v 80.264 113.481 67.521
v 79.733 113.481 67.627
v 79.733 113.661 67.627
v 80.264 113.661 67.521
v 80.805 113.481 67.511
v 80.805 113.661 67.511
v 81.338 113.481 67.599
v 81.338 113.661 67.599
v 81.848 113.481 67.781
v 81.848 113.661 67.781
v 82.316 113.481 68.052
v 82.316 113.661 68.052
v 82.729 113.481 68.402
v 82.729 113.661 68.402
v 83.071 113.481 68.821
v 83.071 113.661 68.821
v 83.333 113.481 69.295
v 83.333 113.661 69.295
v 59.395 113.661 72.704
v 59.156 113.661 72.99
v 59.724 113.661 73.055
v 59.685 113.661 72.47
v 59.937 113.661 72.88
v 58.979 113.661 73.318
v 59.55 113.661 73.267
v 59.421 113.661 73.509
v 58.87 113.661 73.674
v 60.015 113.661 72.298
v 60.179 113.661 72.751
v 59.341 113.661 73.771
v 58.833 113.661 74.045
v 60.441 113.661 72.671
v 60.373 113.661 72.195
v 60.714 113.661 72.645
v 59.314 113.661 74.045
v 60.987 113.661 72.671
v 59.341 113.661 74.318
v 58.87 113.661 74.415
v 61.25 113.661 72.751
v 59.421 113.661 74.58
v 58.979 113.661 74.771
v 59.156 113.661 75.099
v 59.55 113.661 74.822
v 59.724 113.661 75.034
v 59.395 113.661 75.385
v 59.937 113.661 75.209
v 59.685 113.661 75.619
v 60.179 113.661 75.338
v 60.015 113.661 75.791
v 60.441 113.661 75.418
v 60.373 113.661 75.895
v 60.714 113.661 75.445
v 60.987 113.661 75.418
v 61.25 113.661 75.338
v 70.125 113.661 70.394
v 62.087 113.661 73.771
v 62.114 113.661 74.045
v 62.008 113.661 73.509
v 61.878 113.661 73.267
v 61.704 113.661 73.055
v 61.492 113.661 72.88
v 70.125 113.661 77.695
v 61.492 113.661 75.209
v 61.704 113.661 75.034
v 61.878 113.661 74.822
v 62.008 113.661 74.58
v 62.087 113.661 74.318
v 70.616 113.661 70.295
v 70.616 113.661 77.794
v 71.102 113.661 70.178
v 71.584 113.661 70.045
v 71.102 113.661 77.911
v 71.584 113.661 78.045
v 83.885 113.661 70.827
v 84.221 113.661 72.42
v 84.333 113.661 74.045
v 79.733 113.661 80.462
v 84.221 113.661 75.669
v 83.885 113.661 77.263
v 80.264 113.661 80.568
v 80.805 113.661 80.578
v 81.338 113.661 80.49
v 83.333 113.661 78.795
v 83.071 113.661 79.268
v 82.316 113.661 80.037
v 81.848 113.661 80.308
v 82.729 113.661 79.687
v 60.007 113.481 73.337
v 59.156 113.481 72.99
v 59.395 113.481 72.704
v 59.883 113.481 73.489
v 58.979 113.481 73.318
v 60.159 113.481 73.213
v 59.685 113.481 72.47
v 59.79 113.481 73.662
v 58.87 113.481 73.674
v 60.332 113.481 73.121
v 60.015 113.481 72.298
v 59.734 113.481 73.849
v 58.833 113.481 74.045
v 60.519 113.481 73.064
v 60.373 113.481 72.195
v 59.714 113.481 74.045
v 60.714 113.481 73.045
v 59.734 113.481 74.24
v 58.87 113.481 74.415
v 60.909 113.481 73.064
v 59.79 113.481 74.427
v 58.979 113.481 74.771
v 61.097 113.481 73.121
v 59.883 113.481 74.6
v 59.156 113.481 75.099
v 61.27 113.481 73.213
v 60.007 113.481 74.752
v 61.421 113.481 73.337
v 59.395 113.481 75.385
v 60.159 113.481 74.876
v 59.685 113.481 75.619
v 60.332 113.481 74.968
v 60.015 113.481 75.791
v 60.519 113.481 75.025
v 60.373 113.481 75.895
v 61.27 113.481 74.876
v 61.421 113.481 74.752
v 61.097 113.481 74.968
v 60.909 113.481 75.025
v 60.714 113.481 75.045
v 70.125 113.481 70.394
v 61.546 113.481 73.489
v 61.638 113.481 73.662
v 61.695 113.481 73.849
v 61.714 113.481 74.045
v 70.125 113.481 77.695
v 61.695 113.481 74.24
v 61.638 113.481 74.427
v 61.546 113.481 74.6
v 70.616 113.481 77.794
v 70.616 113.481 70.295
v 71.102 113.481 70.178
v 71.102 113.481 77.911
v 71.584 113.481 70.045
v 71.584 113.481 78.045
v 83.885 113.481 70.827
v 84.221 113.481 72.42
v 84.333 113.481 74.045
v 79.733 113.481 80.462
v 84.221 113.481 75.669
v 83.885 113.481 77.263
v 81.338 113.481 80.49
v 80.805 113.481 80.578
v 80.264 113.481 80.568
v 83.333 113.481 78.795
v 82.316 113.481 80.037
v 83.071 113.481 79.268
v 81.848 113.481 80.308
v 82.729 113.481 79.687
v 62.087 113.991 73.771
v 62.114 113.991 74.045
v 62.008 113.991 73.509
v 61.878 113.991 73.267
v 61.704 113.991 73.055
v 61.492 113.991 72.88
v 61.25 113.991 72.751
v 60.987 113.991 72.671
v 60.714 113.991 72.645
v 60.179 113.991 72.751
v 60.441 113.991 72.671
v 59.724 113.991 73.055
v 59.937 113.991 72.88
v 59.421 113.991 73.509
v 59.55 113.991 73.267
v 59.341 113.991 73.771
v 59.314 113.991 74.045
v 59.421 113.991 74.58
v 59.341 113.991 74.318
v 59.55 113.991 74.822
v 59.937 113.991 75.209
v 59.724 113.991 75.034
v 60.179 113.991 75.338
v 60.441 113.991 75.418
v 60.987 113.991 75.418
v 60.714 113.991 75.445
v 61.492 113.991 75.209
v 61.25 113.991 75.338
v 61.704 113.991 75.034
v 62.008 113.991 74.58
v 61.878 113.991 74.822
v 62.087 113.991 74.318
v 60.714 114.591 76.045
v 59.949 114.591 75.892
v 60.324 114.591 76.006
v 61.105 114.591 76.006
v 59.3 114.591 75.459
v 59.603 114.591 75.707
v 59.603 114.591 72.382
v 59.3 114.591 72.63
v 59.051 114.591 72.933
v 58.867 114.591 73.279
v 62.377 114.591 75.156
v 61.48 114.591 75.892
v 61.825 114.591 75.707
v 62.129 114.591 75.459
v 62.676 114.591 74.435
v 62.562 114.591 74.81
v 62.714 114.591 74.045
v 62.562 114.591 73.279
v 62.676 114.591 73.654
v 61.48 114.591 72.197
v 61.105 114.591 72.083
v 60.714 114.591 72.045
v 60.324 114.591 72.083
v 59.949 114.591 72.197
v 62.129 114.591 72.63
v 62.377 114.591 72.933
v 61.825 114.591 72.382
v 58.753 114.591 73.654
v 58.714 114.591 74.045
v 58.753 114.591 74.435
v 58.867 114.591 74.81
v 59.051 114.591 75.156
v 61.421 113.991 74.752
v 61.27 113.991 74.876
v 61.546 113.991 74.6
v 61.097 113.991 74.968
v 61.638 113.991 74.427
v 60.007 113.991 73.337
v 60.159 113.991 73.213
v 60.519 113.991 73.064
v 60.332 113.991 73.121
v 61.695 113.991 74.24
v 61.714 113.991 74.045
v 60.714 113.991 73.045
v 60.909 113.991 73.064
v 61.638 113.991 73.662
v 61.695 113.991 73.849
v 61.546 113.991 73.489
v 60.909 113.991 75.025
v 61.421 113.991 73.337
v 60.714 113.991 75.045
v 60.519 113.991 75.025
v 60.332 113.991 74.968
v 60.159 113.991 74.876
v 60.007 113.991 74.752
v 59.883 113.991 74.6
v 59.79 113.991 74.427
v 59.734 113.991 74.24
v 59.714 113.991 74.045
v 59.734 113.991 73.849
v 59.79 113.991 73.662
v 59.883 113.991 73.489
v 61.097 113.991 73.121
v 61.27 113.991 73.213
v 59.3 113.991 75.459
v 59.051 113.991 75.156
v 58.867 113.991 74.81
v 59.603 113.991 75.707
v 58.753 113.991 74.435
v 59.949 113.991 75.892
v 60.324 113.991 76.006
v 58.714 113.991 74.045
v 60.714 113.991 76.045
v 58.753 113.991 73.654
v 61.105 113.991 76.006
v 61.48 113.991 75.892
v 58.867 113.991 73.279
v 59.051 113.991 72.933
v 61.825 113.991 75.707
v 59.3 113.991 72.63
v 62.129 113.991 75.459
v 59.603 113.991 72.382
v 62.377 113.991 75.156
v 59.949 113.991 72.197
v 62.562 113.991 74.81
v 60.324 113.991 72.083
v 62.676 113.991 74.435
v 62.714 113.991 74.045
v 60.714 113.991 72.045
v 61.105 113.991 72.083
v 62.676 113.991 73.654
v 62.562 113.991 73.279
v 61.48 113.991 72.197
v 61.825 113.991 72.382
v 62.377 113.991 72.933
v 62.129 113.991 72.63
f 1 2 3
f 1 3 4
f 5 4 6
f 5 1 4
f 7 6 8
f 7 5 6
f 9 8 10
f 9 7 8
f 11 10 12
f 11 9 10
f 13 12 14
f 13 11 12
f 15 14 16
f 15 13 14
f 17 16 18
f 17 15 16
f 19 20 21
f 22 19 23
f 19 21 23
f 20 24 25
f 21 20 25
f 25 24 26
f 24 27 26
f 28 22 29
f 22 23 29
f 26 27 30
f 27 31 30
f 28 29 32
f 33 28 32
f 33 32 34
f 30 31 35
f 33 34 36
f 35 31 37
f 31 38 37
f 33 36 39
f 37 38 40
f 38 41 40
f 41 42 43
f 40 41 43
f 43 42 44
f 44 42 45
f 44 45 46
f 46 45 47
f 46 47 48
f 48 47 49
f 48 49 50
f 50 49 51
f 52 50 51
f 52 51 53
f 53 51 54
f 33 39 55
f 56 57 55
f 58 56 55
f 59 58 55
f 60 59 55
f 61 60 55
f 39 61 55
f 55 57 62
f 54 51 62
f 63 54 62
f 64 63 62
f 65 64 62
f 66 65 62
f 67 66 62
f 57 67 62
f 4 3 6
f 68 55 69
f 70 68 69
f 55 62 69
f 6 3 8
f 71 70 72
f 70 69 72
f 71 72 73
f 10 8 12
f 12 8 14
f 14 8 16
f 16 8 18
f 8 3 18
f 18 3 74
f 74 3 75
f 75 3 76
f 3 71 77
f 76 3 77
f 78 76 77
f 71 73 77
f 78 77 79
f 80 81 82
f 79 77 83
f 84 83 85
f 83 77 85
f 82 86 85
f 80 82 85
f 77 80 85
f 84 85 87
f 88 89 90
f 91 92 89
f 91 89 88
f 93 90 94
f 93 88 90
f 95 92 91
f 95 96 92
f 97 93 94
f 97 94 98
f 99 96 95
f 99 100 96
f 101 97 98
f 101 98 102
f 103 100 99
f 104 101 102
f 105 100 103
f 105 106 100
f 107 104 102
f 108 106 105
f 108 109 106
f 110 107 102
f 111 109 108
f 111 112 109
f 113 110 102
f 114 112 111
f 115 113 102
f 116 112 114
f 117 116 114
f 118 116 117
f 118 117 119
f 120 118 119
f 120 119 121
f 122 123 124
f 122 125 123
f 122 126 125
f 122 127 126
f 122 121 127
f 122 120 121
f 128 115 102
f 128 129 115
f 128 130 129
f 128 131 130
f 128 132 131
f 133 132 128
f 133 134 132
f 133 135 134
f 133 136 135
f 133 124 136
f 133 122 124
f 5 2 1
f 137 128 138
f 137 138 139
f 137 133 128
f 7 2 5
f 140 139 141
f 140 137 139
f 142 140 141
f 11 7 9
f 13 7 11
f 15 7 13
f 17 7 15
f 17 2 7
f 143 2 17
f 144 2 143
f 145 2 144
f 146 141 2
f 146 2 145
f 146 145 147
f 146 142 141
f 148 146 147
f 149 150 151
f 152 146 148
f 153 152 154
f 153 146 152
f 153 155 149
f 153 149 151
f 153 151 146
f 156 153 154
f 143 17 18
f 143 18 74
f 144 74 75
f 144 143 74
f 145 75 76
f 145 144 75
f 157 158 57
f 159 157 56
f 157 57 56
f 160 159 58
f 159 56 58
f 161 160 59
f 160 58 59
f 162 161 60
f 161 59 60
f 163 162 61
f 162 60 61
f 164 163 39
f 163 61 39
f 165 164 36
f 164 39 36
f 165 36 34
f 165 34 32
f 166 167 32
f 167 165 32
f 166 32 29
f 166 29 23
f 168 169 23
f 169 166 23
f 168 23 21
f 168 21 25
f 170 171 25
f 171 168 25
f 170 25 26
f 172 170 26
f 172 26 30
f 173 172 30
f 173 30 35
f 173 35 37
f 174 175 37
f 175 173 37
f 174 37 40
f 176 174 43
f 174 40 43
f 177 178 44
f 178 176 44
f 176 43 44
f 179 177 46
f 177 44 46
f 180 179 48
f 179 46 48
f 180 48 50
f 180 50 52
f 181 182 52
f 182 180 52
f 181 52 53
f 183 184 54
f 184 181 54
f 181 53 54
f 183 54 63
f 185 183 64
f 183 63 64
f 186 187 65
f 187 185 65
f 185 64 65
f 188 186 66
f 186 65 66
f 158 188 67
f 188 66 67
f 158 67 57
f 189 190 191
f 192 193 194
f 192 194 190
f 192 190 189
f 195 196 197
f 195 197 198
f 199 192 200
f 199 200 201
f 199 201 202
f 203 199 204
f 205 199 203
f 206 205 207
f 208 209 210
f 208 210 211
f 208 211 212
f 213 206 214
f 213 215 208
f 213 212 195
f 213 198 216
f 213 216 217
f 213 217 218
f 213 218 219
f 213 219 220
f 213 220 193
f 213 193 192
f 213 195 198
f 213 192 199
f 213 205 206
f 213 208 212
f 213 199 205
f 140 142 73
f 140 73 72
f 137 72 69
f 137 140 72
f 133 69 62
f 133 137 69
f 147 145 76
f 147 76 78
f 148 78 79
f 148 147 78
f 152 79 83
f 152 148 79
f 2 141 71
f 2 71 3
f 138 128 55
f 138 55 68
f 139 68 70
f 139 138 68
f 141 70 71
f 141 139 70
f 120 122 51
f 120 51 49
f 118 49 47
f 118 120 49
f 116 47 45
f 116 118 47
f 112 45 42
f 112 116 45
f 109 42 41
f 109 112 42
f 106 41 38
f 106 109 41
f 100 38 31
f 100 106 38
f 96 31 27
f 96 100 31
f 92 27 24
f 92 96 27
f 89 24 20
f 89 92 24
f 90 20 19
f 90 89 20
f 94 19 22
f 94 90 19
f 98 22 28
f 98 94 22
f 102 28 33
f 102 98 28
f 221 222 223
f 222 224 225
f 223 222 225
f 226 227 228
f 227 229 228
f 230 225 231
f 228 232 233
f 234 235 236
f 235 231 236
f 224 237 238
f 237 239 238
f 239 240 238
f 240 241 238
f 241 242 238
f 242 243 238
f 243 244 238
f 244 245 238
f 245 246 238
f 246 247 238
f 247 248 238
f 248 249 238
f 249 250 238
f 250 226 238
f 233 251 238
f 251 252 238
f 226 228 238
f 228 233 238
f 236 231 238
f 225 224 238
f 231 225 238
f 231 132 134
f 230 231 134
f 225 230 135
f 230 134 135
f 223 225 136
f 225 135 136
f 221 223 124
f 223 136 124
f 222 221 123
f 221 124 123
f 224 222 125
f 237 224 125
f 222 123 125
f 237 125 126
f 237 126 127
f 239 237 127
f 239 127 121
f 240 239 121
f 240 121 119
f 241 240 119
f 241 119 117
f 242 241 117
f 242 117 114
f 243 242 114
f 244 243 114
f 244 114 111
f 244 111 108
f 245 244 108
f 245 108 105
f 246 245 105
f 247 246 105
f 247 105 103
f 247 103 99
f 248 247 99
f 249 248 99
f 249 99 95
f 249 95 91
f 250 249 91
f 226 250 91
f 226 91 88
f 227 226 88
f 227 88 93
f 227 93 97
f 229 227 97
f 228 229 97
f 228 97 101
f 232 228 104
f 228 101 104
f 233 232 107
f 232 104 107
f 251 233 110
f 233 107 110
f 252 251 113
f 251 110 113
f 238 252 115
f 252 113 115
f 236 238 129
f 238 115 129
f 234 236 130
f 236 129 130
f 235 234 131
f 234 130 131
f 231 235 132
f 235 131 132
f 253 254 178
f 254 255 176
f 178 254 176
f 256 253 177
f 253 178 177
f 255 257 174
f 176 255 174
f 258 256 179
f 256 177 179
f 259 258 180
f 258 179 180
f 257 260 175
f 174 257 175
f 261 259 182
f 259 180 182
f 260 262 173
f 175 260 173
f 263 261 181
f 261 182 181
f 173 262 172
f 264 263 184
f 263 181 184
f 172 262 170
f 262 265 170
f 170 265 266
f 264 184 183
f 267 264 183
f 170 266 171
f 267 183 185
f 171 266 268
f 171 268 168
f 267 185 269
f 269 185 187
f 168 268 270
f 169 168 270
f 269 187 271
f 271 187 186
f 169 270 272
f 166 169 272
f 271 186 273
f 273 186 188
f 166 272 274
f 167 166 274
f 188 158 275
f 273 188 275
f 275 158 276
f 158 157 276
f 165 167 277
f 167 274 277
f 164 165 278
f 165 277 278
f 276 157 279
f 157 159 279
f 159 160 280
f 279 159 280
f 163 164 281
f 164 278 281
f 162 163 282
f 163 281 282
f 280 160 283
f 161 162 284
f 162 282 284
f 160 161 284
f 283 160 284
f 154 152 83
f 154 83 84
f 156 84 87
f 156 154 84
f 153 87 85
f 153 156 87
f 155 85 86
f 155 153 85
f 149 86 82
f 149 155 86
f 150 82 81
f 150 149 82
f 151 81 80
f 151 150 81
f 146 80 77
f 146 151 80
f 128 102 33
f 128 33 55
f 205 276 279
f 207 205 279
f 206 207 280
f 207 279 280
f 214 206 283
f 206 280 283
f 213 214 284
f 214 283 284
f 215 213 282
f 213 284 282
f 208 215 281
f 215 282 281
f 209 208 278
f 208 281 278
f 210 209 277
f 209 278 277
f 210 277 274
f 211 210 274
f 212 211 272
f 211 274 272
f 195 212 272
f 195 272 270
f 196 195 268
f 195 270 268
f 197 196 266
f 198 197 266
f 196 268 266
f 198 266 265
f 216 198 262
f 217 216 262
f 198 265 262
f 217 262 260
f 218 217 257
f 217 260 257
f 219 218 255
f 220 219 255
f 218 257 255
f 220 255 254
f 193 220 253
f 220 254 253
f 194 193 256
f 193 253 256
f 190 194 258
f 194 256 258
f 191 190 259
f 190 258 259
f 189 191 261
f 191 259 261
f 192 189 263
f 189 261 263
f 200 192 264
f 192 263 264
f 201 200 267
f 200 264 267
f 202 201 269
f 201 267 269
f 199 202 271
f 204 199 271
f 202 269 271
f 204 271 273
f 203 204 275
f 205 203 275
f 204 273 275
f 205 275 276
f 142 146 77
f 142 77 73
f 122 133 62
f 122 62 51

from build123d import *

# Parameters (mm, degrees)
BOSS_EXTRUDE2_DEPTH = 0.18
SKETCH4_R           = 1
CUT_EXTRUDE1_DEPTH  = 1.18
SKETCH7_R           = 2
BOSS_EXTRUDE3_DEPTH = 0.6
SKETCH8_R           = 1.4
SKETCH8_R_2         = 1
BOSS_EXTRUDE4_DEPTH = 0.93


with BuildPart() as part:
    # Sketch2 → Boss-Extrude2 (new body)
    with BuildSketch(Plane.XZ.offset(-113.480952772)):
        with BuildLine():
            Line((60.372883835, 72.194540047), (70.125446667, 70.394451024))
            ThreePointArc((70.125446667, 70.394451024), (70.859385482, 70.238798062), (71.58406324, 70.044540047))
            Line((71.58406324, 70.044540047), (79.733100179, 67.627269484))
            ThreePointArc((79.733100179, 67.627269484), (81.847875106, 67.781237193), (83.333100179, 69.294540047))
            ThreePointArc((83.333100179, 69.294540047), (84.080389833, 71.617479067), (84.333100179, 74.044540047))
            ThreePointArc((84.333100179, 74.044540047), (84.080389833, 76.471601027), (83.333100179, 78.794540047))
            ThreePointArc((83.333100179, 78.794540047), (81.847875106, 80.307842901), (79.733100179, 80.46181061))
            Line((79.733100179, 80.46181061), (71.58406324, 78.044540047))
            ThreePointArc((71.58406324, 78.044540047), (70.859385482, 77.850282031), (70.125446667, 77.69462907))
            Line((70.125446667, 77.69462907), (60.372883835, 75.894540047))
            ThreePointArc((60.372883835, 75.894540047), (58.833100179, 74.044540047), (60.372883835, 72.194540047))
        make_face()
    extrude(amount=-BOSS_EXTRUDE2_DEPTH)

    # Sketch4 → Cut-Extrude1 (cut, through all)
    with BuildSketch(Plane.XZ.offset(-113.480952772)):
        with Locations((60.714349432, 74.044540047)):
            Circle(SKETCH4_R)
    extrude(amount=-CUT_EXTRUDE1_DEPTH, mode=Mode.SUBTRACT)



with BuildPart() as body_2:
    # Sketch7 → Boss-Extrude3 (new body)
    with BuildSketch(Plane(origin=(0, 113.990952772, 0), x_dir=(1, 0, 0), z_dir=(0, 1, 0))):
        with Locations((60.714349432, -74.044540047)):
            Circle(SKETCH7_R)
    extrude(amount=BOSS_EXTRUDE3_DEPTH)


with BuildPart() as part_1:
    add(part.part)

    add(body_2.part)  # Boss-Extrude4 merges body 2
    # Sketch8 → Boss-Extrude4 (add)
    with BuildSketch(Plane(origin=(0, 113.660952772, 0), x_dir=(1, 0, 0), z_dir=(0, 1, 0))):
        with Locations((60.714349432, -74.044540047)):
            Circle(SKETCH8_R)
        with Locations((60.714349432, -74.044540047)):
            Circle(SKETCH8_R_2, mode=Mode.SUBTRACT)
    extrude(amount=BOSS_EXTRUDE4_DEPTH)


solid = part_1.part
